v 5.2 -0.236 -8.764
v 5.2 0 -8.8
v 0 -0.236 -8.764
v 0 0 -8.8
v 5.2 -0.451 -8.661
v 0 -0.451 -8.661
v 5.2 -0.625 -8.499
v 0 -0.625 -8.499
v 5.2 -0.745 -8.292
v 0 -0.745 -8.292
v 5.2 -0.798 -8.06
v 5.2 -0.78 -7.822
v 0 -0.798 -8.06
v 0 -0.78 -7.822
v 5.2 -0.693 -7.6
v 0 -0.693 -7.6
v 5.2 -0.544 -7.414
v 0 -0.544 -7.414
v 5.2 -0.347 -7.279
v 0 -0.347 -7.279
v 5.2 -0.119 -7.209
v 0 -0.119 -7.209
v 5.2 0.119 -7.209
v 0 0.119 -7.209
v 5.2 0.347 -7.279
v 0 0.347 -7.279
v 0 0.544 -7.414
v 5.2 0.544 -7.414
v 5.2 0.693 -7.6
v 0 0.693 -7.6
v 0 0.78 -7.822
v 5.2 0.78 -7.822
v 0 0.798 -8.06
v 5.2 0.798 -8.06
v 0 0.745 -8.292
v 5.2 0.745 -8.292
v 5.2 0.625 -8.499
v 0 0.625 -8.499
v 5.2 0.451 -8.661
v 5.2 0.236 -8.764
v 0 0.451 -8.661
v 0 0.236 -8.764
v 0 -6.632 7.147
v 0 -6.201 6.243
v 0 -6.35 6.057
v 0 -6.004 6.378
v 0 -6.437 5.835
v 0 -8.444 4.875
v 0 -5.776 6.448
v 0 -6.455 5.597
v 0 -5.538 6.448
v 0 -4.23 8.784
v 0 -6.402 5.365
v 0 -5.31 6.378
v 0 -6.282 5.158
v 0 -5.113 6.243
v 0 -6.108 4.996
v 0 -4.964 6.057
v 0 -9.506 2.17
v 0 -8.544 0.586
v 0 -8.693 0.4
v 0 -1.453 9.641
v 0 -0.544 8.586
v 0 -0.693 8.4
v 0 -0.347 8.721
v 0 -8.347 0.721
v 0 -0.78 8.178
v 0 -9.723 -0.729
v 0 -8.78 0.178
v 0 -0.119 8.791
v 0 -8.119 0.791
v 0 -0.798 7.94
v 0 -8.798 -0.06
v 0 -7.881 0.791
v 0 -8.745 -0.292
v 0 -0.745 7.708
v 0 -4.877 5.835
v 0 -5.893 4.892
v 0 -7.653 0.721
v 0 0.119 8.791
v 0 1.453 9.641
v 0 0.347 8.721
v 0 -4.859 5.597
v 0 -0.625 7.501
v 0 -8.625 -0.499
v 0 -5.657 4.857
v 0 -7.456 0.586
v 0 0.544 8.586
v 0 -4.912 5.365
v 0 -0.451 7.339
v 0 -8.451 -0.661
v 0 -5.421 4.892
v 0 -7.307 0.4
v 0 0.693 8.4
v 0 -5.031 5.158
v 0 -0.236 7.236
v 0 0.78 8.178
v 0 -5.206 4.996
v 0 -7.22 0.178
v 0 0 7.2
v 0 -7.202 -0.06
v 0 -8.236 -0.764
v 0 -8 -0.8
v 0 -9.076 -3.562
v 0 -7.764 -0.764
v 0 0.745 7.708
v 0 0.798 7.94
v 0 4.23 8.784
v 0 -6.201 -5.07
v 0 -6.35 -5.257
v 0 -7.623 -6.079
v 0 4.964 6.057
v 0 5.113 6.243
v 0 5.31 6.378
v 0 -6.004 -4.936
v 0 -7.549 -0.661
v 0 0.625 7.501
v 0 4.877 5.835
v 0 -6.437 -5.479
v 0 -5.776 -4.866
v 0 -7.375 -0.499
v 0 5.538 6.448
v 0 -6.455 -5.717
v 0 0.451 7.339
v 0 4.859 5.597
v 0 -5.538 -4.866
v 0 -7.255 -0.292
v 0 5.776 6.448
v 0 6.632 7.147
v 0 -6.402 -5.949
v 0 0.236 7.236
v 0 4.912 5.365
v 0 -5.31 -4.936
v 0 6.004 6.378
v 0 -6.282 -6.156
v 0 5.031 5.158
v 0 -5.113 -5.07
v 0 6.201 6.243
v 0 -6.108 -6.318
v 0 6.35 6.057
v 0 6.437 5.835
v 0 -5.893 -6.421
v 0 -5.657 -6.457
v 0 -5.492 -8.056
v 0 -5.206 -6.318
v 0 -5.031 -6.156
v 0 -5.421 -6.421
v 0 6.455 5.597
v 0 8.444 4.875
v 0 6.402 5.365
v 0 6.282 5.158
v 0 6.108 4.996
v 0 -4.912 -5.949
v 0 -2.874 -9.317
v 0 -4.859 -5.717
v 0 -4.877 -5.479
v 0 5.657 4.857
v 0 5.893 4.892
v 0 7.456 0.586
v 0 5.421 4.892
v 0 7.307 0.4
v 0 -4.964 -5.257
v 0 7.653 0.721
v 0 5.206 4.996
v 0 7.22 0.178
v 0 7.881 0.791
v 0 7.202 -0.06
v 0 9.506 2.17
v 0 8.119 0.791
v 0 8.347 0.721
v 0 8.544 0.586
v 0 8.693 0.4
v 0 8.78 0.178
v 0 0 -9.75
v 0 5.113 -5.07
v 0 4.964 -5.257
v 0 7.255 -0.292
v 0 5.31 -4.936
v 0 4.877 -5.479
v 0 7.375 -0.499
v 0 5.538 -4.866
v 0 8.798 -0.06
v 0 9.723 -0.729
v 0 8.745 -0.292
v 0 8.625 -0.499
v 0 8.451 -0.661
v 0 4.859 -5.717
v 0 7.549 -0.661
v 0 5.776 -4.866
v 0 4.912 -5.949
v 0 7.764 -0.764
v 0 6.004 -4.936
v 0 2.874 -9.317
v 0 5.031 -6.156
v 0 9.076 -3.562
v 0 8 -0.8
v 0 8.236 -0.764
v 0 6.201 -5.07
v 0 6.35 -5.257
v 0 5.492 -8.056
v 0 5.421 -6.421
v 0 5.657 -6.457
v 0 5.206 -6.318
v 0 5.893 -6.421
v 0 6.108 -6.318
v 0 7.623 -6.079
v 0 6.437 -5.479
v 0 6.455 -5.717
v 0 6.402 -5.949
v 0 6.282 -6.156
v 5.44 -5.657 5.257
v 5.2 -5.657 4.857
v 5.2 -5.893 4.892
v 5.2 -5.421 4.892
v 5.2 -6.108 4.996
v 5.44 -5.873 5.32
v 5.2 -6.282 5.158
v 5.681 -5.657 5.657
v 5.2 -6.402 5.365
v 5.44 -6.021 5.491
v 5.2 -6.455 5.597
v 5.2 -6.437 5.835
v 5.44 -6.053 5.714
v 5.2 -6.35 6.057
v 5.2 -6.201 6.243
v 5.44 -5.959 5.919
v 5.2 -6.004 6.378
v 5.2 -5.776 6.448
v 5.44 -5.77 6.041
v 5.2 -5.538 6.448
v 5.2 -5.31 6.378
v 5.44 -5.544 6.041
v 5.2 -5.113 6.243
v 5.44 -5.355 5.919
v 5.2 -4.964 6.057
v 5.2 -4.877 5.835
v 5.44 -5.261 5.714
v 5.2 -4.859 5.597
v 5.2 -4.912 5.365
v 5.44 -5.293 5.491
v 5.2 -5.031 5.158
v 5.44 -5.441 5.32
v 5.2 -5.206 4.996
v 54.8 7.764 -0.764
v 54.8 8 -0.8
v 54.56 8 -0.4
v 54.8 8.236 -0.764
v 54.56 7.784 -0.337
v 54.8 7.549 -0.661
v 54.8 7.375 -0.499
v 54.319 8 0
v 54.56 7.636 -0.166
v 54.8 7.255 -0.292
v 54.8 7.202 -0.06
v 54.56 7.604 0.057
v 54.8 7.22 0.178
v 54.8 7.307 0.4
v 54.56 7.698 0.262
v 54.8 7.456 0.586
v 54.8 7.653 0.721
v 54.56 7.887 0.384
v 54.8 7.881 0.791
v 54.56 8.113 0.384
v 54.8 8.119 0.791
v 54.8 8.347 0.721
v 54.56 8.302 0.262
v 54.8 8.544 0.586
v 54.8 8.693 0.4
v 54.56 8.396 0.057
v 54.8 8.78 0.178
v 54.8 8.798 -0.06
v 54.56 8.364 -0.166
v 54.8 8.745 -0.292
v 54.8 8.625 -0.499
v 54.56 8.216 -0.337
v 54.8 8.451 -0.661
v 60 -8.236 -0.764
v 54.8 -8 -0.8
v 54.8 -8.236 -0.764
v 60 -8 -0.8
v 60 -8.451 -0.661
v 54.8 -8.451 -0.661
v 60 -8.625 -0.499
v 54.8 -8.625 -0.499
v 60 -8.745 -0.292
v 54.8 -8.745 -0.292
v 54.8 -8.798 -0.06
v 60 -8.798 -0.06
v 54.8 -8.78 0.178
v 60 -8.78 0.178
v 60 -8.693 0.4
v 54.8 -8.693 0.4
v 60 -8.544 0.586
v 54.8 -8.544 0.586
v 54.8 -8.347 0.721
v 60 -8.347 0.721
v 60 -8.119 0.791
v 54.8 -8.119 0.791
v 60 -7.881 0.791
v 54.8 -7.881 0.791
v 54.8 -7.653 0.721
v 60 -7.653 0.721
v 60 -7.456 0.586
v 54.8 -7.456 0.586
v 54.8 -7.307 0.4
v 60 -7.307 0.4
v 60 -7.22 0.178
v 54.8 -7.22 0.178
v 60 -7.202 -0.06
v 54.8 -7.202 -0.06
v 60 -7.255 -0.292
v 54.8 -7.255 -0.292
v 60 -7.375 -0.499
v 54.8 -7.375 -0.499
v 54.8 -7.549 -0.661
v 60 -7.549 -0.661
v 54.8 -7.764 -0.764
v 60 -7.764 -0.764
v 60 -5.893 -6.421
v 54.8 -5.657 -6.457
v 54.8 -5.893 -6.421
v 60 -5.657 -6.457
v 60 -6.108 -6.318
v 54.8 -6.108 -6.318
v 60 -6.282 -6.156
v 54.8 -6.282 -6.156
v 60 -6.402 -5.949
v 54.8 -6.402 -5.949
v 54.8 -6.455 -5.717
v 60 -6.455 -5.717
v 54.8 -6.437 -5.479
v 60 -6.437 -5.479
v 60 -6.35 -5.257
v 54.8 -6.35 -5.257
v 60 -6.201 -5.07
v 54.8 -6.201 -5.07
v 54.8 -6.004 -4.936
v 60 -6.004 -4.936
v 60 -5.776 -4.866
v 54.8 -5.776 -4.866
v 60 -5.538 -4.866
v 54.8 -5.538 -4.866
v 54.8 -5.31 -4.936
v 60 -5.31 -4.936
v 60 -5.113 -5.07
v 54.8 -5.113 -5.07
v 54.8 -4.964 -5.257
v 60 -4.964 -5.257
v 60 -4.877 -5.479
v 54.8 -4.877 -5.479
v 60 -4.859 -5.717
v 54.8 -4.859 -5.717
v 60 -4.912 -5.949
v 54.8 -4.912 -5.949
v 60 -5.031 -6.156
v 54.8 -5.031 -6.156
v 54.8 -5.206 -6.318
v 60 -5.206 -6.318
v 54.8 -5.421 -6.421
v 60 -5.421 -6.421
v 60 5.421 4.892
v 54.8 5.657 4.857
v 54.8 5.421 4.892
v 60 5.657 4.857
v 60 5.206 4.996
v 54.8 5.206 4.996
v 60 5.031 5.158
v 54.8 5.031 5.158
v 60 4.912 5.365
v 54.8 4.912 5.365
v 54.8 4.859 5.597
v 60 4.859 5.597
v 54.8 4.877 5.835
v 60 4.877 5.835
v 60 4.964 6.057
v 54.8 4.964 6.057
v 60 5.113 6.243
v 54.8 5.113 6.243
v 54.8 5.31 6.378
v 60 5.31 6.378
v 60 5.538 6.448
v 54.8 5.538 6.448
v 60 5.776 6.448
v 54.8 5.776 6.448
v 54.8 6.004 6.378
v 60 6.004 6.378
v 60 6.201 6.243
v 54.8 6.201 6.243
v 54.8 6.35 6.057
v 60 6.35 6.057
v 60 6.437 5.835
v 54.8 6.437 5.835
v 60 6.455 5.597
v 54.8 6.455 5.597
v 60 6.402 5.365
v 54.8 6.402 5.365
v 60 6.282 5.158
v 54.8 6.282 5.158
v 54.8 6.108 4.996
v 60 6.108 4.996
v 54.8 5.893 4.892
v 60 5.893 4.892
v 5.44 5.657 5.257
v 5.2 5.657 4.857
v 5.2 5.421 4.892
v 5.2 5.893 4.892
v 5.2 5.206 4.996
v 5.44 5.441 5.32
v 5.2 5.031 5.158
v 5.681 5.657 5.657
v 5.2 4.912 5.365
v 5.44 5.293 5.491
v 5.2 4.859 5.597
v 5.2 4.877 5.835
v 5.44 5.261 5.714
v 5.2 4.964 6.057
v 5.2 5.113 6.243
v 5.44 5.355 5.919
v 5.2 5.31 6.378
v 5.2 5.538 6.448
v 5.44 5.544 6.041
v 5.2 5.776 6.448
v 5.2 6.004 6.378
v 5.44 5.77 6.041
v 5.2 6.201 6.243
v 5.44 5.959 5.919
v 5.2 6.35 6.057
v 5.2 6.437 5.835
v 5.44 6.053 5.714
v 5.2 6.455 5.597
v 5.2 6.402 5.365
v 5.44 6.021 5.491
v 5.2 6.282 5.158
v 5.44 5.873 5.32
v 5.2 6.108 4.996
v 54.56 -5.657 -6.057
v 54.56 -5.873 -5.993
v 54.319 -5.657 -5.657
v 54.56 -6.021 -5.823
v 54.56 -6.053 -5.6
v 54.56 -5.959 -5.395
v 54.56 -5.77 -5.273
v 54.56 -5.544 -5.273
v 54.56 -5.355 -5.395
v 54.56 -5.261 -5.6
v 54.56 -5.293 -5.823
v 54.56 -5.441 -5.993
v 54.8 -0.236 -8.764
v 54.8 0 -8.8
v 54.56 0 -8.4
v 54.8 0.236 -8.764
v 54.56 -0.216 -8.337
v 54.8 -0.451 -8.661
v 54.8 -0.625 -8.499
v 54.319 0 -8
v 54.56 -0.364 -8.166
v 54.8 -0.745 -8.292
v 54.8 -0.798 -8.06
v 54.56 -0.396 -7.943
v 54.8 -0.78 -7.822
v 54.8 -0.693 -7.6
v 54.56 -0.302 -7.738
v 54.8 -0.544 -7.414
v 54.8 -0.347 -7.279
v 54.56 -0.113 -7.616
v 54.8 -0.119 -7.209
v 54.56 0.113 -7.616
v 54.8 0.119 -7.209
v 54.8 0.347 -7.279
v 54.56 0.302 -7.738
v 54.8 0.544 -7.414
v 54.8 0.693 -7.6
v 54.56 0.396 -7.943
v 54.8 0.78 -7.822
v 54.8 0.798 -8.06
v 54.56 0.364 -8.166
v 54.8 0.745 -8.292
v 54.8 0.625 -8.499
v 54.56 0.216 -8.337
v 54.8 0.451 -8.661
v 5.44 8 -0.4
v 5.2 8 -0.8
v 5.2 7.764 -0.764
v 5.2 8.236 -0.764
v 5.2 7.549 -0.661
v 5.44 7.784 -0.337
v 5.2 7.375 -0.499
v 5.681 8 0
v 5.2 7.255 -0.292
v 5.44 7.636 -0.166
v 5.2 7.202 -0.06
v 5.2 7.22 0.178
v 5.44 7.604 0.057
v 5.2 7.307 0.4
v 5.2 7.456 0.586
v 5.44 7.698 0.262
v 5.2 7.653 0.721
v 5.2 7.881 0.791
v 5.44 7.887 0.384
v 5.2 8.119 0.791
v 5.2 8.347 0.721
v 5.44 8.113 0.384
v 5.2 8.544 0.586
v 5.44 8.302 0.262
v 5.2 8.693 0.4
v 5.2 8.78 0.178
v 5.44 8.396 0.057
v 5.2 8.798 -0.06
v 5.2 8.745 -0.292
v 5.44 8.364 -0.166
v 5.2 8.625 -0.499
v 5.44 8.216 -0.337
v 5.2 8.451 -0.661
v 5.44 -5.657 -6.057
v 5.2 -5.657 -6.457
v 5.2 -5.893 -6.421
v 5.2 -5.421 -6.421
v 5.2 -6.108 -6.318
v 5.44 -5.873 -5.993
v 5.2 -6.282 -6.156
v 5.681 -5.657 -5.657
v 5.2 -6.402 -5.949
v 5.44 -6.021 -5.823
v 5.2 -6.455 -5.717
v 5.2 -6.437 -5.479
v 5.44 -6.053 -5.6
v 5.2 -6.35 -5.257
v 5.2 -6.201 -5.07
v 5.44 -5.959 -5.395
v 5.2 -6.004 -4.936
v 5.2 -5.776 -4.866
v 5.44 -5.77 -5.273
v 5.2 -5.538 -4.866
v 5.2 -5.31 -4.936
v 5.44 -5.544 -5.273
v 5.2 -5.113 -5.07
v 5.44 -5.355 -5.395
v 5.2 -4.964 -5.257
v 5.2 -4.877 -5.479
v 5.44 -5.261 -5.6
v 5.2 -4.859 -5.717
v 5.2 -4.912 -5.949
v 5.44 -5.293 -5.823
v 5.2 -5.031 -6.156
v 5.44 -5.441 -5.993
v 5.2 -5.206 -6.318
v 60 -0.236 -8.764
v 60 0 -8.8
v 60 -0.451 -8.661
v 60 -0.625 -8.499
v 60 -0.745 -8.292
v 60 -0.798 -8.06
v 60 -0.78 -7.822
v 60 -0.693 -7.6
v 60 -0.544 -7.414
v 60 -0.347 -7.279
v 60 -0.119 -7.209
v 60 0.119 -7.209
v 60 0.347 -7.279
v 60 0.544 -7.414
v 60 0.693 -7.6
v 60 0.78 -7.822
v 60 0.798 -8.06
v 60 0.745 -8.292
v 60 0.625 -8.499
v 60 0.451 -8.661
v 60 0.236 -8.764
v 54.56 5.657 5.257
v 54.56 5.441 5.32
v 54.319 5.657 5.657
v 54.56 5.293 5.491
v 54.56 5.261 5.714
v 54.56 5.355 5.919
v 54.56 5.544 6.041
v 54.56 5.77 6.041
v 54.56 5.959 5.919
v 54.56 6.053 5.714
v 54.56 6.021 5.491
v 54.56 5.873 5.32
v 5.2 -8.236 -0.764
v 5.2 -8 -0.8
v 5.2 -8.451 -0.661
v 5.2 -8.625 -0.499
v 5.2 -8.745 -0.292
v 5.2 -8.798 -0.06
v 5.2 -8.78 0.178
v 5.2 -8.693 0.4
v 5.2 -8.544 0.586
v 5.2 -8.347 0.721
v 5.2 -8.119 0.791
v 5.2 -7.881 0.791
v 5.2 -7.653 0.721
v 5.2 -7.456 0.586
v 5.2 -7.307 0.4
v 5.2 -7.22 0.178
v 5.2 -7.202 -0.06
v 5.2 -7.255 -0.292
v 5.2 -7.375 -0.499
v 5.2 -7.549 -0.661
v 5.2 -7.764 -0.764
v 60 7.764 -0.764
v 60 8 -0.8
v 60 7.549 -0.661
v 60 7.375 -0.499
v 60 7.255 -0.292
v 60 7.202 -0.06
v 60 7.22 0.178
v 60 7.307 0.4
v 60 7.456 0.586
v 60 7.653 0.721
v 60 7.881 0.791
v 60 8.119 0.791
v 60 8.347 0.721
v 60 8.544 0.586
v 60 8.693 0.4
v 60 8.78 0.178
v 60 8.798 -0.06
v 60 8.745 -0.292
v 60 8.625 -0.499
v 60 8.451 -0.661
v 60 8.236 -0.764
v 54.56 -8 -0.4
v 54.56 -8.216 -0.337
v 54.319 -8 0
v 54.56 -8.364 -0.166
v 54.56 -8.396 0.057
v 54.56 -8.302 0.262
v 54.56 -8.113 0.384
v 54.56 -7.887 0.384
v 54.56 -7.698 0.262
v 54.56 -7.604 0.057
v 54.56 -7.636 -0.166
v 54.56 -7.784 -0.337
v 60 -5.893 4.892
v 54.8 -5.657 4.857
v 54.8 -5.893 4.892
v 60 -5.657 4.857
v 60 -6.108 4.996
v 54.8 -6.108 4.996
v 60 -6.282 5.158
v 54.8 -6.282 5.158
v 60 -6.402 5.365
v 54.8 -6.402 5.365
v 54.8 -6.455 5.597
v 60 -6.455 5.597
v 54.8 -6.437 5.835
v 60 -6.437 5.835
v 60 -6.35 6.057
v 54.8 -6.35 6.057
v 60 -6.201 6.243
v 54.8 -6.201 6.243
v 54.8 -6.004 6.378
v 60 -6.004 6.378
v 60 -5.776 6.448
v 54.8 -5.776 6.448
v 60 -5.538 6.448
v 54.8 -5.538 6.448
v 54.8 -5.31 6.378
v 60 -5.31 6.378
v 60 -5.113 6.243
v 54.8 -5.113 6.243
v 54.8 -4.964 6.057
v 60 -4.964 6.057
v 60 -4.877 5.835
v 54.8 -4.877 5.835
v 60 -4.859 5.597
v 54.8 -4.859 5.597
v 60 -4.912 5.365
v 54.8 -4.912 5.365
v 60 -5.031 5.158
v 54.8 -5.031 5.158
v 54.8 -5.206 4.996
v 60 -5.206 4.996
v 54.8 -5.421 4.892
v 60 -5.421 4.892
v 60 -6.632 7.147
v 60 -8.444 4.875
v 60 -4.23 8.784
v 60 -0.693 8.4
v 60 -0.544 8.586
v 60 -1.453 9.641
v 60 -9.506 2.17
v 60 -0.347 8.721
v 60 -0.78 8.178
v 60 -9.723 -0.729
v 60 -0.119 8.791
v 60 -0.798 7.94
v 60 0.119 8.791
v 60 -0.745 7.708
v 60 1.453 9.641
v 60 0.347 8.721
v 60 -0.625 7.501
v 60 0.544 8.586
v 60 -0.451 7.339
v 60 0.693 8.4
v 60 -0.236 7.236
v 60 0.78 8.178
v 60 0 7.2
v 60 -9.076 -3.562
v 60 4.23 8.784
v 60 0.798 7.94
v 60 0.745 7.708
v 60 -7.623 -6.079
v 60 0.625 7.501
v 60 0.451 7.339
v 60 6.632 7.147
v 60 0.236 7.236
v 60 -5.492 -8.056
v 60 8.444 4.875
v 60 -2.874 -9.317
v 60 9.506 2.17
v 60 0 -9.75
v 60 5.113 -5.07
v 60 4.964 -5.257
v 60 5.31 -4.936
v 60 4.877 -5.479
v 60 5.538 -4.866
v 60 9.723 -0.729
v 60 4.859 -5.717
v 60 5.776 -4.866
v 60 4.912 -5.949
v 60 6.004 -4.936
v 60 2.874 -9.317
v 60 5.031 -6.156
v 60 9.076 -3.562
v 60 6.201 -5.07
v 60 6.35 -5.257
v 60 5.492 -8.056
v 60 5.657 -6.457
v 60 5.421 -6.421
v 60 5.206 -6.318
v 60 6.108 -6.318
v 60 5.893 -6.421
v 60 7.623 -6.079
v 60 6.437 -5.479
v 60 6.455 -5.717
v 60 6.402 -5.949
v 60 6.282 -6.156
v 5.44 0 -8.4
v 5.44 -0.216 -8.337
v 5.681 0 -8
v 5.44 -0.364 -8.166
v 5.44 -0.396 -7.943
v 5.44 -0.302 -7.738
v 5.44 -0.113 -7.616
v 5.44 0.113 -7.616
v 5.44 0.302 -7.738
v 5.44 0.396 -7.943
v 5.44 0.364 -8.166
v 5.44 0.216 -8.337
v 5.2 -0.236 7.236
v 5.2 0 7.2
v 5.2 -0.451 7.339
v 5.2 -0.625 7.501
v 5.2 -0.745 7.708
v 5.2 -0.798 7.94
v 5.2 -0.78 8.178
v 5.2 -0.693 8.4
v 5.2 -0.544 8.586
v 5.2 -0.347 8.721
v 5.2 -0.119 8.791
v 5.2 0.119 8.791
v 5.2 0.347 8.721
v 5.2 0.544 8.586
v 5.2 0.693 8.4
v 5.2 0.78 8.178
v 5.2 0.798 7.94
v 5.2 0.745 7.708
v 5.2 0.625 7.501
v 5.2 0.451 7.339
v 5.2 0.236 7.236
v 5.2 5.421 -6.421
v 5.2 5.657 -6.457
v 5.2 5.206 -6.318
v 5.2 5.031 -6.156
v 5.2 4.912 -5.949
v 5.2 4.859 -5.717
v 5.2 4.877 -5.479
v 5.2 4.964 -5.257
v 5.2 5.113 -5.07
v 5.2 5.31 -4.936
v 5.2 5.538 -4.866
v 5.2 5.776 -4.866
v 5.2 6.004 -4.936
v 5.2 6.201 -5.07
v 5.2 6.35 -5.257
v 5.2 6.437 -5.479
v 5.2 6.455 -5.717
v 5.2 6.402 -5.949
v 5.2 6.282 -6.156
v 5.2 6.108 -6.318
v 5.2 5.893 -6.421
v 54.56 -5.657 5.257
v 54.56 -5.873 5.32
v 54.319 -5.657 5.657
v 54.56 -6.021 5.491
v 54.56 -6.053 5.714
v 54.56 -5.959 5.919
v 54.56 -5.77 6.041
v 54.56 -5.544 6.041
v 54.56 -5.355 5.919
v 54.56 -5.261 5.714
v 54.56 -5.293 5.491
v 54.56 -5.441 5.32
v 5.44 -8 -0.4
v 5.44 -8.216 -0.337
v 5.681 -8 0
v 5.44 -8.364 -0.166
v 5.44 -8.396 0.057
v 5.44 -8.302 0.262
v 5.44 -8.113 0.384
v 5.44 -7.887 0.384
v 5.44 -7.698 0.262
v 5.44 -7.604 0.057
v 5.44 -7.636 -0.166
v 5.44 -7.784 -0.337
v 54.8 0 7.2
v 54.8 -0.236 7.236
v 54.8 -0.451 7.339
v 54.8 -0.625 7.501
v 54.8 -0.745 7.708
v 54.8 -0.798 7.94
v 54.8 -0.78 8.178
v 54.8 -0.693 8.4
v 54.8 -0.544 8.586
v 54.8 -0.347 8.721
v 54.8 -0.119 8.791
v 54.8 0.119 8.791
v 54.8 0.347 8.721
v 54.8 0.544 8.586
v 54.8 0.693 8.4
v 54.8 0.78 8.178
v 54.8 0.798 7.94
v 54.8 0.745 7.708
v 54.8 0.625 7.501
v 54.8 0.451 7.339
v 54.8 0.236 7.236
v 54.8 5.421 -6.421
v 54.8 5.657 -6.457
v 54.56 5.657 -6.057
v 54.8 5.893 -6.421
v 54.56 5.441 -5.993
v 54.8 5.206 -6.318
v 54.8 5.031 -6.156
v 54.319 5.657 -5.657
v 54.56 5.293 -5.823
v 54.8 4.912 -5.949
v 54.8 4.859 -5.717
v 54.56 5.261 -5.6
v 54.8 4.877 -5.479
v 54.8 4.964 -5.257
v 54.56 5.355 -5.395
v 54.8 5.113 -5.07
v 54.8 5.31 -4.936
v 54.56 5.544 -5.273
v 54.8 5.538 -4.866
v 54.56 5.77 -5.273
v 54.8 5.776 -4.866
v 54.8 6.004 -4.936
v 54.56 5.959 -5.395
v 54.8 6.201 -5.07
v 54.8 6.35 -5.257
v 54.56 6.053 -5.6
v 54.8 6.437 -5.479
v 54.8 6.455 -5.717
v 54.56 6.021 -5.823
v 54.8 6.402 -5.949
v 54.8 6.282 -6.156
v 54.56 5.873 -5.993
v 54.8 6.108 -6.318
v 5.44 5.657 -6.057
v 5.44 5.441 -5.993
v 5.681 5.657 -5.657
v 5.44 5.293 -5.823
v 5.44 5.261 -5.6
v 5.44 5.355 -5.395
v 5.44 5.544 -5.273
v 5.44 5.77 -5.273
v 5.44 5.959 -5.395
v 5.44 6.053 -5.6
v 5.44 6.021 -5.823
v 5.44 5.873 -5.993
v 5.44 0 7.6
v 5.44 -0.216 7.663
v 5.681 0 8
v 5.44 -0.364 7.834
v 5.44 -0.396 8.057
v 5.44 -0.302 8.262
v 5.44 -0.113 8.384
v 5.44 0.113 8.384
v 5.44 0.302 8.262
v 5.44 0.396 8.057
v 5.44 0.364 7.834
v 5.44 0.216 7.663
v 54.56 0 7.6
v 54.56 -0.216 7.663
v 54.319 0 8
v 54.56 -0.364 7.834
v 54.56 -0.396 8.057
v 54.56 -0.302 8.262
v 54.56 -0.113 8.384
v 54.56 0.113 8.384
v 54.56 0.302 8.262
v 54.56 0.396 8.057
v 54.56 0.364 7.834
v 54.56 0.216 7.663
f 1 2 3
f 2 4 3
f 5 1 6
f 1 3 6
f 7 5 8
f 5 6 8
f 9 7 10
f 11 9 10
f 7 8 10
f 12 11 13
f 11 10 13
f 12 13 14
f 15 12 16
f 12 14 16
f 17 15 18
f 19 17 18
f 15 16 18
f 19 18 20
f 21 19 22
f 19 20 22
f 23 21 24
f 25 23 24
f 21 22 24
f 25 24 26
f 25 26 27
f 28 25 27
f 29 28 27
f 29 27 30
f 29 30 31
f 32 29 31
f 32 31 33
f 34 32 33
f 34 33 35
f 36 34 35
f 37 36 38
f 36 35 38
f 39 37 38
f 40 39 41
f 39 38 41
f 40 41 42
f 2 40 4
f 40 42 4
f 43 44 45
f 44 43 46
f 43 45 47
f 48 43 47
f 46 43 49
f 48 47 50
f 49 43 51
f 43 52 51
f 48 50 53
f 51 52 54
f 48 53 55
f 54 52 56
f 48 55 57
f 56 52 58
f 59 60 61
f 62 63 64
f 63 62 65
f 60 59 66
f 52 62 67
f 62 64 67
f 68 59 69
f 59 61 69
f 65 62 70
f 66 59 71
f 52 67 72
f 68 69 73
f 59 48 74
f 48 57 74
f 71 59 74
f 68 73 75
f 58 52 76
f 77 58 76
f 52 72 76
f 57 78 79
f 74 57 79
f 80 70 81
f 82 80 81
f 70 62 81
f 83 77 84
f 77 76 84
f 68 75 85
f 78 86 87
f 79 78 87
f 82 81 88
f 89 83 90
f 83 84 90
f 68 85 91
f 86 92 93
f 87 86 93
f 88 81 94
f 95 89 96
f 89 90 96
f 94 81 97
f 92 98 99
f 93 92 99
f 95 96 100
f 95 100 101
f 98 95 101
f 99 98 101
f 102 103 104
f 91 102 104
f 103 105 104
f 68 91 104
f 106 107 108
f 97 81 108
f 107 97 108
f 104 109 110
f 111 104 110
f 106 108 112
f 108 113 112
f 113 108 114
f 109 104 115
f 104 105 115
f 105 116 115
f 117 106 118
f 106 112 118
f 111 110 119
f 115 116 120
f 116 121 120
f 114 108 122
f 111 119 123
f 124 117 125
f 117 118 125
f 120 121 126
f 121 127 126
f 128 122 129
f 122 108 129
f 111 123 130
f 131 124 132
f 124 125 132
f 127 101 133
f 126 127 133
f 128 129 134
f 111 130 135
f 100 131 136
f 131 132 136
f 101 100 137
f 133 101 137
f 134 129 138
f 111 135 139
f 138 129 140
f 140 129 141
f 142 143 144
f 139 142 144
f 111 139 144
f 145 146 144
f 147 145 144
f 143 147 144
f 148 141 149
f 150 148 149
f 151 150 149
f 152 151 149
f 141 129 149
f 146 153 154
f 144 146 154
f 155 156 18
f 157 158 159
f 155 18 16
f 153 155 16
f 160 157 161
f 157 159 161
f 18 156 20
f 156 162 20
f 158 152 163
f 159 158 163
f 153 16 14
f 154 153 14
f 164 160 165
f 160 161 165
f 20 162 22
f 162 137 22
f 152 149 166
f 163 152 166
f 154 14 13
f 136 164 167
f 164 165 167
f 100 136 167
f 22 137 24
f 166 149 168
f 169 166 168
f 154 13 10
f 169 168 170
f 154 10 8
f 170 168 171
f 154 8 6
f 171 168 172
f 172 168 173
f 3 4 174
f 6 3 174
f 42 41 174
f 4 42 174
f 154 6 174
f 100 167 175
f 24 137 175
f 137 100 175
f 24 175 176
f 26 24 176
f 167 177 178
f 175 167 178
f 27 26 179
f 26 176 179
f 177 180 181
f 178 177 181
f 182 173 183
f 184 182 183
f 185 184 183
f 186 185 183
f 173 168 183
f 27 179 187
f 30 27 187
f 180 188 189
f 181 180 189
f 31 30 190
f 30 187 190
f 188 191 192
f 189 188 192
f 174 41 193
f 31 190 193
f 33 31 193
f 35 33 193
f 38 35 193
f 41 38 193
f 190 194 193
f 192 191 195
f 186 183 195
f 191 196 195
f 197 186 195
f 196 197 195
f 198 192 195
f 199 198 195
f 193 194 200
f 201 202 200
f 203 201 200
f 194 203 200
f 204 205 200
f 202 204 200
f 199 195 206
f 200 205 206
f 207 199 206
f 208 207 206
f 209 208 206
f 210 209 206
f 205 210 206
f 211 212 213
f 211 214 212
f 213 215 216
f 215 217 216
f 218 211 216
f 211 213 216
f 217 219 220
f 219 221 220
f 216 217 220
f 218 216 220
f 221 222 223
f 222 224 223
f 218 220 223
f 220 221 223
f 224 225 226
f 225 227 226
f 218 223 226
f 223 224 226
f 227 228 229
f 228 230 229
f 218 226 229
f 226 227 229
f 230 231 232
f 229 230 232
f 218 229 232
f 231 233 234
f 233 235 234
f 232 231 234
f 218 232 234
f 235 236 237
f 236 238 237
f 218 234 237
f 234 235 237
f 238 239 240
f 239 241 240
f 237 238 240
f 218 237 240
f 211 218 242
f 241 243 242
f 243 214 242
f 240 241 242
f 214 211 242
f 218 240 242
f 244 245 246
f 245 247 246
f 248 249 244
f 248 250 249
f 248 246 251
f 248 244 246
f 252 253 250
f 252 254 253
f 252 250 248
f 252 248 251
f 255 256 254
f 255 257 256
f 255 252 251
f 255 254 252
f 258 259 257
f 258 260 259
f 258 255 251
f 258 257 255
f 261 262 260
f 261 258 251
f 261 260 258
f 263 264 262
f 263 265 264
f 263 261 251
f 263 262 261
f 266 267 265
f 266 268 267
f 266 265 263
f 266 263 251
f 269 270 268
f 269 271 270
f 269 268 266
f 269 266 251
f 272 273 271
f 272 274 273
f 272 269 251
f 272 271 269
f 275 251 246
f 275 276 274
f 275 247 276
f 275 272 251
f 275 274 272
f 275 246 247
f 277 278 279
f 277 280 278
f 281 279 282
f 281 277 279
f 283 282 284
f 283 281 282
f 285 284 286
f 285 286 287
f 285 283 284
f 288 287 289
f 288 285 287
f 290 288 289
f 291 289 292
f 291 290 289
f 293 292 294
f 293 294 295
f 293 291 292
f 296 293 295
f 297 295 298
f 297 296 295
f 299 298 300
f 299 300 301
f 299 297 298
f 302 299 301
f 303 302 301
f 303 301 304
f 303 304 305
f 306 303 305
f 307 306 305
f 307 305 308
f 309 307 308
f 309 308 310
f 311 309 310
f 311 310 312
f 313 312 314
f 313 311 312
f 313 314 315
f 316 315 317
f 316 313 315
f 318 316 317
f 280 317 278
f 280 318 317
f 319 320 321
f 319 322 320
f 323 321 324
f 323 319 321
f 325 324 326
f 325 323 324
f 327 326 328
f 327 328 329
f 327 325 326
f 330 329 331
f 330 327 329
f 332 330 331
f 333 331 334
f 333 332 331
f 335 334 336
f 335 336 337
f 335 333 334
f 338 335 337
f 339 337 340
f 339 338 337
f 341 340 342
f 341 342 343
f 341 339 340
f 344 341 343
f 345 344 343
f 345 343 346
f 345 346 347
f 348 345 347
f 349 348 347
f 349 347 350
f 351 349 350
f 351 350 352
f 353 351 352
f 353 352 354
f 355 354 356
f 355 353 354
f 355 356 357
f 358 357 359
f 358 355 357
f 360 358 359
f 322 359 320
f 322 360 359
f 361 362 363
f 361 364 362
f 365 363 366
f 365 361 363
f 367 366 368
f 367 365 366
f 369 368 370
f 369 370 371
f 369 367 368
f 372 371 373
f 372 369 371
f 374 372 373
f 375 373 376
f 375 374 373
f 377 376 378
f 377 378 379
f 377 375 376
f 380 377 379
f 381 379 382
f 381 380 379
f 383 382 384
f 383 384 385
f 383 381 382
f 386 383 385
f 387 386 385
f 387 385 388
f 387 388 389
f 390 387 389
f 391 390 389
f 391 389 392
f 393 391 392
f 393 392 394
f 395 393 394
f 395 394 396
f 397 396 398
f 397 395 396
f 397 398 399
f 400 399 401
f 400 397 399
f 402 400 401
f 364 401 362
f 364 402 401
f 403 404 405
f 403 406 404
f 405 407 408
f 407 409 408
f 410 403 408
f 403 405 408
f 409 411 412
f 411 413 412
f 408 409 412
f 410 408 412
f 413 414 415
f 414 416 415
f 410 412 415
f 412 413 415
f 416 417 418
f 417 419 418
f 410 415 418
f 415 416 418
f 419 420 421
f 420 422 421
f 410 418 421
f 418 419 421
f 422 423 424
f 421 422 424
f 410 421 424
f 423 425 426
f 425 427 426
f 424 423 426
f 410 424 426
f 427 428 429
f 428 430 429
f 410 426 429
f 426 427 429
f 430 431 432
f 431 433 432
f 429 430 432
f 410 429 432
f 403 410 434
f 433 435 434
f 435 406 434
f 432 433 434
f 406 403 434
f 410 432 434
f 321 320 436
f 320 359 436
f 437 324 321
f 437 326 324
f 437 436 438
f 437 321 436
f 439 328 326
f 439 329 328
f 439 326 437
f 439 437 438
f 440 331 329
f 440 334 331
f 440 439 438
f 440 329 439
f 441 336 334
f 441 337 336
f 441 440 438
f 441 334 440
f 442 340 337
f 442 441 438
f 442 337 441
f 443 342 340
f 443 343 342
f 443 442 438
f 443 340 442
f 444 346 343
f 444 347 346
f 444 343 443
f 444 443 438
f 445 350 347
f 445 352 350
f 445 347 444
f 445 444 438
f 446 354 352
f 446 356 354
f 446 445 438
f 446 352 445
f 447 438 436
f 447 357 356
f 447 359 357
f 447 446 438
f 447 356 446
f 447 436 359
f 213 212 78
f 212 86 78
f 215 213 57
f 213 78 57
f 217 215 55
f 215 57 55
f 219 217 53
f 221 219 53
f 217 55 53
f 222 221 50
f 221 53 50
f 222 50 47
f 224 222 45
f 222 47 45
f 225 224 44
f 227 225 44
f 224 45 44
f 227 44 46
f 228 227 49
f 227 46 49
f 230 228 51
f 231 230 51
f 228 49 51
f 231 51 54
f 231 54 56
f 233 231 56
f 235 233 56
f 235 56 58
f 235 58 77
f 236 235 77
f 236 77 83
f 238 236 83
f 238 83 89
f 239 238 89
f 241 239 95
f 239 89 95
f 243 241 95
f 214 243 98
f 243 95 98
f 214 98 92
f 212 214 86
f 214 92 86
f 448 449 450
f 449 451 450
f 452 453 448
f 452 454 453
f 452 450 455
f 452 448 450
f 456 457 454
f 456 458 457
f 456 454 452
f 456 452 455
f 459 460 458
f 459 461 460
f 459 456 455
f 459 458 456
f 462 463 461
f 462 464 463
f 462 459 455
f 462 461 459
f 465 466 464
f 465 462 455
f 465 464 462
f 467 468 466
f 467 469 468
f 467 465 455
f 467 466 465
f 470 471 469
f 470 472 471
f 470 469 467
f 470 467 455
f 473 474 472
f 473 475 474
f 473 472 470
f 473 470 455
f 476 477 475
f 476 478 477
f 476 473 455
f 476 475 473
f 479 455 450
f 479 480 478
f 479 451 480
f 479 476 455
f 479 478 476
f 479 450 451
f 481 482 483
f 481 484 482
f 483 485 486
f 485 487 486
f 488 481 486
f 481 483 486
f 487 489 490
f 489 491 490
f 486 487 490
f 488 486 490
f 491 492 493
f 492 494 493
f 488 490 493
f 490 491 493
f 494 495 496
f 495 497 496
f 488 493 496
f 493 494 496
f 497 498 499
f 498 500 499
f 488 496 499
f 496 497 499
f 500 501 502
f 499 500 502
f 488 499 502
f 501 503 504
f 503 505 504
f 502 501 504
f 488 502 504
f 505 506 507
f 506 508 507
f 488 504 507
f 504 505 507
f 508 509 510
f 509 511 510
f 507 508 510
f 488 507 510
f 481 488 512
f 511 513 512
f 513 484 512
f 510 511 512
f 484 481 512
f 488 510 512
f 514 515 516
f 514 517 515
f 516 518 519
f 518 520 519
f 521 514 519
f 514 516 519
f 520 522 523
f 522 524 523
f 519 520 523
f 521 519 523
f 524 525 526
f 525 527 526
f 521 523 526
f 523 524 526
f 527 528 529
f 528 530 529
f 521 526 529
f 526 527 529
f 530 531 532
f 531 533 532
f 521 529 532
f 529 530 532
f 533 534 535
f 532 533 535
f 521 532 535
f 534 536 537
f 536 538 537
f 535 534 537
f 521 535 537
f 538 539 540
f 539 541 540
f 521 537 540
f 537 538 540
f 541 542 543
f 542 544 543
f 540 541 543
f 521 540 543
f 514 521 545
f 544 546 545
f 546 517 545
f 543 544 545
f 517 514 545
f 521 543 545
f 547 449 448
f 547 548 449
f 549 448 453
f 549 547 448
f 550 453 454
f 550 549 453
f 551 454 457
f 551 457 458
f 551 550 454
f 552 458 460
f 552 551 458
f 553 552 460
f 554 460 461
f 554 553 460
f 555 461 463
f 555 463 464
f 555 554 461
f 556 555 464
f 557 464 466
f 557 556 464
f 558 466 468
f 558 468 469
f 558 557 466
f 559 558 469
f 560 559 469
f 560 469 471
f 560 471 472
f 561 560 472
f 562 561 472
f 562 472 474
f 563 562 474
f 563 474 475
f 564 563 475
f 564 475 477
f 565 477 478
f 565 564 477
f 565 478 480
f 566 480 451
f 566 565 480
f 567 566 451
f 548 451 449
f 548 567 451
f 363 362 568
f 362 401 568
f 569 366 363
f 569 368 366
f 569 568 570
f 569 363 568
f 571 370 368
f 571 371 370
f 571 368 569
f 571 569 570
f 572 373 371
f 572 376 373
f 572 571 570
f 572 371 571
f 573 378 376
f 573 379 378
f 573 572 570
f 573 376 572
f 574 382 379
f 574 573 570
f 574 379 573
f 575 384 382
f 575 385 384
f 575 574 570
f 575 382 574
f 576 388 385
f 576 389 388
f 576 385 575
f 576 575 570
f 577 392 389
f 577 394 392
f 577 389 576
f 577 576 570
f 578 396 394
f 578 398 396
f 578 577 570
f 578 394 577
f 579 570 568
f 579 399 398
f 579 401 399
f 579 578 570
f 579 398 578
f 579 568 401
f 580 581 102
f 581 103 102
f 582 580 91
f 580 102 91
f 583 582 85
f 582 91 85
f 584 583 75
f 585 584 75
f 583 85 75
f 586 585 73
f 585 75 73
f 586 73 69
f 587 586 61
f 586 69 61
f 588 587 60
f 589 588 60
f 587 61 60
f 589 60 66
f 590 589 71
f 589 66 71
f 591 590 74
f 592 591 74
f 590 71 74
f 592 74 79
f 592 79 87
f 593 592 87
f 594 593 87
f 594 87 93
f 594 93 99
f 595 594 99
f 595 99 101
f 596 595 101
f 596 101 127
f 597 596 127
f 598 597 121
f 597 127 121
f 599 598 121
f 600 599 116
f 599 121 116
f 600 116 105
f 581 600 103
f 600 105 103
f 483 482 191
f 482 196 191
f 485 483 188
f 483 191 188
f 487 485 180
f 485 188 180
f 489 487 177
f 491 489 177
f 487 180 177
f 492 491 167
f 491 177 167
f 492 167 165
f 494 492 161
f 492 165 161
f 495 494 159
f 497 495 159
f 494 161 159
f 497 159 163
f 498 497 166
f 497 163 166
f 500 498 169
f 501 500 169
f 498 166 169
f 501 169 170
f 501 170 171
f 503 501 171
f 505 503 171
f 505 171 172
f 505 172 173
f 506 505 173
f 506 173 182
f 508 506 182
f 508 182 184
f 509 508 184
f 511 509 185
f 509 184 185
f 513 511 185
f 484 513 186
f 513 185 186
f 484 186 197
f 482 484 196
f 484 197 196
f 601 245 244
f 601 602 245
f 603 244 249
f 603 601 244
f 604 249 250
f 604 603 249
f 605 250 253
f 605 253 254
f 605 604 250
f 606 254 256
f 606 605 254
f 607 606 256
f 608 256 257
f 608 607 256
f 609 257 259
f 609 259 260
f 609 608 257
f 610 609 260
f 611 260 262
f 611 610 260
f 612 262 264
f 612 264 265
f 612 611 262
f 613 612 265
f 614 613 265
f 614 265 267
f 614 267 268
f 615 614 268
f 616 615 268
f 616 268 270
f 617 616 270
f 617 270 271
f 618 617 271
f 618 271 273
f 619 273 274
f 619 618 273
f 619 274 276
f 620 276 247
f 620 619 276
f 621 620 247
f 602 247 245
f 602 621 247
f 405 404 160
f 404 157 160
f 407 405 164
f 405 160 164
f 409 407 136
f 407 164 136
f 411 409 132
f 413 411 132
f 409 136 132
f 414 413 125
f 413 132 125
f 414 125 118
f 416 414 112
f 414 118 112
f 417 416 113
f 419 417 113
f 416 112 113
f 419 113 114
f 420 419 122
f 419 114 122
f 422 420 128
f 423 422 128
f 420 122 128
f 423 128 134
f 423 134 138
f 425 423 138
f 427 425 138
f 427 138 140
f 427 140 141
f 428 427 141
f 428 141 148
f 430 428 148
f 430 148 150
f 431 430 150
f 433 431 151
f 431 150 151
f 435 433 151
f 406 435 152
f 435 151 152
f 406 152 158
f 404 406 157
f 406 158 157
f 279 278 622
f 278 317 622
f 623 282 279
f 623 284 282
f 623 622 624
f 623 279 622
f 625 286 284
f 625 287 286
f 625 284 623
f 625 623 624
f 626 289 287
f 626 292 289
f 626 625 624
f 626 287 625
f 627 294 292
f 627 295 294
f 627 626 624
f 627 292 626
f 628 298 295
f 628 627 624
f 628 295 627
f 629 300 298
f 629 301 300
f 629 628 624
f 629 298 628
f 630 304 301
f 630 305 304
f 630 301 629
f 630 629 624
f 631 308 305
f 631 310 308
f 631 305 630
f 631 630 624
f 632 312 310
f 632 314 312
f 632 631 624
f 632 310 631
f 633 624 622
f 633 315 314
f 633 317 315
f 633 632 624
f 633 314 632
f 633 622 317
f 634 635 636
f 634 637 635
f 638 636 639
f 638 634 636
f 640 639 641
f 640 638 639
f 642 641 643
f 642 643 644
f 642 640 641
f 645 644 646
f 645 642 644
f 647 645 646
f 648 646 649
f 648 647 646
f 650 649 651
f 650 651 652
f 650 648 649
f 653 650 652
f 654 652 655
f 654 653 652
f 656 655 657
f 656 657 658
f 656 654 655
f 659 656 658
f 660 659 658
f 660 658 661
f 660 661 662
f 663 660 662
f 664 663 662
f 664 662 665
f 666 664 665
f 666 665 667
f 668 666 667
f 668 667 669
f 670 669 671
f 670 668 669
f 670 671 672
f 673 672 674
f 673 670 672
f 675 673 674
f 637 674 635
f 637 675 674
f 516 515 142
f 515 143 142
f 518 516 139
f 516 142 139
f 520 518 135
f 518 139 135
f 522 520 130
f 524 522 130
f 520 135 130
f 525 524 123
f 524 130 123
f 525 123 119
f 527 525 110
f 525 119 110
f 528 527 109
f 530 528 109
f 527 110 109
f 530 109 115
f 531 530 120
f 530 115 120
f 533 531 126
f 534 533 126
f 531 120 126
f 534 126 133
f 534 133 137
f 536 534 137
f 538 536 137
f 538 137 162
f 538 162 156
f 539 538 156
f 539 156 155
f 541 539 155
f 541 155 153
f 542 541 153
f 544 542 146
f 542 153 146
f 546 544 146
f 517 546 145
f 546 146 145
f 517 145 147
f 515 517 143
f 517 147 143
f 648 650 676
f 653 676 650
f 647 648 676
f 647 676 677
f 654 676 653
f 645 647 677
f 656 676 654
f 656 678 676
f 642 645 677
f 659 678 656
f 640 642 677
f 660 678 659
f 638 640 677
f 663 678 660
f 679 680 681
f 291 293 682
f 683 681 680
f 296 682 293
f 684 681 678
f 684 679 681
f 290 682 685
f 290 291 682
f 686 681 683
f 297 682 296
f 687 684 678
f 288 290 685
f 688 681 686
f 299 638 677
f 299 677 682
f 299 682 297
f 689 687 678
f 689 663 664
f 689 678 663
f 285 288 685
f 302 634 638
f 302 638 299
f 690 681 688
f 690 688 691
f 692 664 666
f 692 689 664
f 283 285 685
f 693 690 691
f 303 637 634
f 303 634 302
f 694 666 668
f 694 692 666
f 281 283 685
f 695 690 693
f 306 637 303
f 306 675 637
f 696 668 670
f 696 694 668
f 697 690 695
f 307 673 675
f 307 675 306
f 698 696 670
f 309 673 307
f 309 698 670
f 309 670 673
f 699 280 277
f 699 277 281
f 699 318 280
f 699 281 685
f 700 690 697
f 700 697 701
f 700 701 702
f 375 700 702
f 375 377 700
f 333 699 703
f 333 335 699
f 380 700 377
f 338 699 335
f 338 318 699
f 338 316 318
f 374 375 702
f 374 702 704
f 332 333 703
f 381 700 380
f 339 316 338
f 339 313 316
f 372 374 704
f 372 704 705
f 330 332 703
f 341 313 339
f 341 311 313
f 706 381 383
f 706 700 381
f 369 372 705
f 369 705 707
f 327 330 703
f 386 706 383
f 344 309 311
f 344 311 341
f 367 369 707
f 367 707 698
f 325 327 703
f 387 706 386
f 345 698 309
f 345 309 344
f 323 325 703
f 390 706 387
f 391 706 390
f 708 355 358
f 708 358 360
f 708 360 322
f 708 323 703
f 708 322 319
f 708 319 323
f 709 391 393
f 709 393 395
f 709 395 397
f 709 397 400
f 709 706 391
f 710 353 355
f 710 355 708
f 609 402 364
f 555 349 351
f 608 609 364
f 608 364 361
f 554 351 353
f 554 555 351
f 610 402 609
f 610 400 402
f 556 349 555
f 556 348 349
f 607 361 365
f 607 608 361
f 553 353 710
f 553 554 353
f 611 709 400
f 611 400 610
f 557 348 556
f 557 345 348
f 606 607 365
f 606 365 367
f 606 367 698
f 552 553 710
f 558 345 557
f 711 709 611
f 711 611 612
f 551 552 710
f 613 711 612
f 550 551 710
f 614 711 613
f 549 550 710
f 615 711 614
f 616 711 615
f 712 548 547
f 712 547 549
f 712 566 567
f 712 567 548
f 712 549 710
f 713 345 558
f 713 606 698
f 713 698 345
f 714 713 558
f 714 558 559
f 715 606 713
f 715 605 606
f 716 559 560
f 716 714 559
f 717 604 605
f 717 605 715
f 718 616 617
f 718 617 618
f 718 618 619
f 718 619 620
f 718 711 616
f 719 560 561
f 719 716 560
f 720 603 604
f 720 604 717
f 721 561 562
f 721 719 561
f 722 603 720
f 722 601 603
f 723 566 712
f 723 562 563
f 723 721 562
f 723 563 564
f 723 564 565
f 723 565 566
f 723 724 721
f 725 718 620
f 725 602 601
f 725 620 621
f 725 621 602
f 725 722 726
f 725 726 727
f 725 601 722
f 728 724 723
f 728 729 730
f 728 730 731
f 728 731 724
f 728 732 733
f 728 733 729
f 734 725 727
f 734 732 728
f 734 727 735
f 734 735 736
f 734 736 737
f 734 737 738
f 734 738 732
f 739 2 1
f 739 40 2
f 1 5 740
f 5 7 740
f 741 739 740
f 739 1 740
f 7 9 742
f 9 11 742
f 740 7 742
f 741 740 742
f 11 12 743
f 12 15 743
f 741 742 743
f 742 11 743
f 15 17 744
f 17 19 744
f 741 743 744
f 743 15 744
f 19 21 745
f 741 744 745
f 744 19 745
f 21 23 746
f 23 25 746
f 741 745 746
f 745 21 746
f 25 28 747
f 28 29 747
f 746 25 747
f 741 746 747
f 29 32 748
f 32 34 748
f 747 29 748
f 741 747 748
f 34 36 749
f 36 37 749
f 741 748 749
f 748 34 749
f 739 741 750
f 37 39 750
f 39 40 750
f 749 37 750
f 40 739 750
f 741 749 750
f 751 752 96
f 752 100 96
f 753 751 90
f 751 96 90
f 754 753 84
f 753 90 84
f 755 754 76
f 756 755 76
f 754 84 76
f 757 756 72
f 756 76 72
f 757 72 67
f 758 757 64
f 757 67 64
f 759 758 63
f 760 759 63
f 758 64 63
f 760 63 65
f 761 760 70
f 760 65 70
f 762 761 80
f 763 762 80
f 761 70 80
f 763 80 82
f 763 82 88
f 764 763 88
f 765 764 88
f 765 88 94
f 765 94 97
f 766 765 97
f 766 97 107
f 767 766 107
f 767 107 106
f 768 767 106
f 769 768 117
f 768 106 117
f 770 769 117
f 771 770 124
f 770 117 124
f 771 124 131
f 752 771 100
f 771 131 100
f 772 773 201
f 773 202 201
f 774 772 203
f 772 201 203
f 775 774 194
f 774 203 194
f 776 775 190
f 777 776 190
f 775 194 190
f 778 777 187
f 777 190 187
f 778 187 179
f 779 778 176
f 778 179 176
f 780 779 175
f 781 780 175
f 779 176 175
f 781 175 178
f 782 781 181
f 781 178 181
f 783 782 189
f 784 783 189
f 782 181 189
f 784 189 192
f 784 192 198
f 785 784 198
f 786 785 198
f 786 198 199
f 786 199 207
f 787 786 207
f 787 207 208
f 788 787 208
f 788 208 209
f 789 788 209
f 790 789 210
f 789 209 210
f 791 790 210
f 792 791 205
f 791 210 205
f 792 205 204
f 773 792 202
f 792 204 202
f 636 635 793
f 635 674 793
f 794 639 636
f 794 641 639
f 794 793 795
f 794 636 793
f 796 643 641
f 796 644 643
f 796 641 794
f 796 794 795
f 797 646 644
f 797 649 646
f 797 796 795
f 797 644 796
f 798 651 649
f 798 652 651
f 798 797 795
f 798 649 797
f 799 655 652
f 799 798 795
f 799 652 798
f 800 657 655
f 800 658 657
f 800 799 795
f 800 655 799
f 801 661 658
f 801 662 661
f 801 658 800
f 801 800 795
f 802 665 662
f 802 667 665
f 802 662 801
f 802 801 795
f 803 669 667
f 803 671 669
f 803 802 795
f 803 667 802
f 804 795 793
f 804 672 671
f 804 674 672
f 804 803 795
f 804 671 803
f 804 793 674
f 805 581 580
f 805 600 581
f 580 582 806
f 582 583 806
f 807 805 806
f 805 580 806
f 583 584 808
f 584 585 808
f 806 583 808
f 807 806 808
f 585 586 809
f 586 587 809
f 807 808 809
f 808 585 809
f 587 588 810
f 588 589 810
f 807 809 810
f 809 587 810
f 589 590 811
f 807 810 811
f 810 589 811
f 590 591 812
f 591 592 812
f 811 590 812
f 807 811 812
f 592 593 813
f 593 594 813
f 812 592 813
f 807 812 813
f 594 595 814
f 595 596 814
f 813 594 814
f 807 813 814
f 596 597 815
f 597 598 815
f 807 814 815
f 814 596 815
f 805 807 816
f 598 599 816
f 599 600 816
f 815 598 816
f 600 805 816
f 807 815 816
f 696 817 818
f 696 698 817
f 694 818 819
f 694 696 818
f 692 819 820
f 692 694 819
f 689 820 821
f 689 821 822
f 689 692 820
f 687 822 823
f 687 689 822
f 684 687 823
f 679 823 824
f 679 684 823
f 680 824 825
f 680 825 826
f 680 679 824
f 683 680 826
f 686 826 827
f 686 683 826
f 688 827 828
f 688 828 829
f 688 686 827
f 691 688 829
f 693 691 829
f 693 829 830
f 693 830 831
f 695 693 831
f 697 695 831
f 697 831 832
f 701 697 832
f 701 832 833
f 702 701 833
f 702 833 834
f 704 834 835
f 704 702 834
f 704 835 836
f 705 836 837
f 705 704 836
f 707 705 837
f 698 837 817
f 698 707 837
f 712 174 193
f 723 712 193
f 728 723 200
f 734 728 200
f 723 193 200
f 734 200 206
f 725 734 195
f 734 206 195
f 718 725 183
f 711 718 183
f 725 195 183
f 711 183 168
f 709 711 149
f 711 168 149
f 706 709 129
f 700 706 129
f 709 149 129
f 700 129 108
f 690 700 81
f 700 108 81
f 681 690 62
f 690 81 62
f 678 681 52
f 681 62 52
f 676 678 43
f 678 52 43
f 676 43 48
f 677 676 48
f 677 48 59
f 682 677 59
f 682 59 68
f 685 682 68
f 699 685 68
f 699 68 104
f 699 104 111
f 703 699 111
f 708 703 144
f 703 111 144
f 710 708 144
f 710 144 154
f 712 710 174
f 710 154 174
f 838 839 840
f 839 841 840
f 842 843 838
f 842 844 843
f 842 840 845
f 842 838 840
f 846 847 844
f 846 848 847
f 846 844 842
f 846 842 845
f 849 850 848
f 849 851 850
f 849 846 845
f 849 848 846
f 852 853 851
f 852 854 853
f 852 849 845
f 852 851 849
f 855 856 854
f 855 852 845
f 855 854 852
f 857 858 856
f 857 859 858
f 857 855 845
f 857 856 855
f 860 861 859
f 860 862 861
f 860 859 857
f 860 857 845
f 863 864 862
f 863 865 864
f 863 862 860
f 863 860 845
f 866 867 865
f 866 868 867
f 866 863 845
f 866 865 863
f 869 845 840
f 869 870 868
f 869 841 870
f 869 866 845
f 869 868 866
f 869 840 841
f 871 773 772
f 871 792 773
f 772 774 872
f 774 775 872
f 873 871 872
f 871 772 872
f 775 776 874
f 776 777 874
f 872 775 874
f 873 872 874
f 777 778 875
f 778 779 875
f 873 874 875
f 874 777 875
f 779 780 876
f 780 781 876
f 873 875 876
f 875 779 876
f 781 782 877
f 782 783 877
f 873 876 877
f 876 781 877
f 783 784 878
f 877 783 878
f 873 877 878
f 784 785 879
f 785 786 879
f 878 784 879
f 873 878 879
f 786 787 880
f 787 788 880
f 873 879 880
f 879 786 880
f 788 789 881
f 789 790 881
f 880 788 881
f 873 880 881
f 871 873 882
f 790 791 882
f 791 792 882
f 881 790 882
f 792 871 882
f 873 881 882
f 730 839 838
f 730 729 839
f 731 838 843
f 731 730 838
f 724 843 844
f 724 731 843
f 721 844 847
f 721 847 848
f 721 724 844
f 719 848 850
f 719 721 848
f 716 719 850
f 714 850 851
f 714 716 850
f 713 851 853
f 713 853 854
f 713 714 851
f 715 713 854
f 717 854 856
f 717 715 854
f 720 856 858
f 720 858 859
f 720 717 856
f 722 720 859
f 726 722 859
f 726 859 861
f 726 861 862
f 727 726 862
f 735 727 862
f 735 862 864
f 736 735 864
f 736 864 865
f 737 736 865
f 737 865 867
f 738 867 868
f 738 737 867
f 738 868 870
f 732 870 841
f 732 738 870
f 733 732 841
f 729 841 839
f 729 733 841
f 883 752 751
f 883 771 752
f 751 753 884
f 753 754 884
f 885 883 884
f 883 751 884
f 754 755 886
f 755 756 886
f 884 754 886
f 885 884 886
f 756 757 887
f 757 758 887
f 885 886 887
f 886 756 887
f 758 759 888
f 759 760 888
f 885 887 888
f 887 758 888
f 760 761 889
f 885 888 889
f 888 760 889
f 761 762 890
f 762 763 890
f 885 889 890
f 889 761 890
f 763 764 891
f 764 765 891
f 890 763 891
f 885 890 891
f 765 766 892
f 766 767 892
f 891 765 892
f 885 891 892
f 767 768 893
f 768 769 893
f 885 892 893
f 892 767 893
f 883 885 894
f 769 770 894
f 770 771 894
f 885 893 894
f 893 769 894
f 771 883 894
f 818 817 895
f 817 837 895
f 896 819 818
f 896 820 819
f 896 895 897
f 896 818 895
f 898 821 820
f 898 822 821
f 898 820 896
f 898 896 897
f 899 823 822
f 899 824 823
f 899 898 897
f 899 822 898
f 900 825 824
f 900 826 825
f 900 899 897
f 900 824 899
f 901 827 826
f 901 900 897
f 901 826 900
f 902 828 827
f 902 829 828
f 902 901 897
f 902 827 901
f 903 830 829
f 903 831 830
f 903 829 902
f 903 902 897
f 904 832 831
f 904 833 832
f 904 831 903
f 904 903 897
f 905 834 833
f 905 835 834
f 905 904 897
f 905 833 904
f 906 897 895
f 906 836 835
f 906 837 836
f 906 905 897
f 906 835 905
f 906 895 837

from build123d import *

# Parameters (mm, degrees)
SKETCH1_R                  = 9.75
BOSS_EXTRUDE1_DEPTH        = 60
M2_TAPPED_HOLE1_AT_2_COUNT = 2
M2_TAPPED_HOLE1_AT_2_PITCH = 6.122934918
M2_TAPPED_HOLE1_AT_3_COUNT = 2
M2_TAPPED_HOLE1_AT_3_PITCH = 11.313708499
M2_TAPPED_HOLE1_AT_4_COUNT = 2
M2_TAPPED_HOLE1_AT_4_PITCH = 14.78207252
M2_TAPPED_HOLE1_AT_5_COUNT = 2
M2_TAPPED_HOLE1_AT_5_PITCH = 16
M2_TAPPED_HOLE1_AT_6_COUNT = 2
M2_TAPPED_HOLE1_AT_6_PITCH = 14.78207252
M2_TAPPED_HOLE1_AT_7_COUNT = 2
M2_TAPPED_HOLE1_AT_7_PITCH = 11.313708499
M2_TAPPED_HOLE1_AT_8_COUNT = 2
M2_TAPPED_HOLE1_AT_8_PITCH = 6.122934918


with BuildPart() as part:
    # Sketch1 → Boss-Extrude1 (new body)
    with BuildSketch(Plane(origin=(0, 0, 0), x_dir=(0, 0, -1), z_dir=(1, 0, 0))):
        Circle(SKETCH1_R)
    extrude(amount=BOSS_EXTRUDE1_DEPTH)

    # Sketch4 → M2 Tapped Hole1 (revolve, cut)
    with BuildSketch(Plane(origin=(60, 8, 0), x_dir=(0, 0, -1), z_dir=(0, 1, 0))):
        Polygon((0, 0), (0, 5.680688495), (0.8, 5.2), (0.8, 0), align=None)
    m2_tapped_hole1 = revolve(axis=Axis((66.35, 8, 0), (-1, 0, 0)), mode=Mode.SUBTRACT)

    # M2 Tapped Hole1 at 2: M2 Tapped Hole1 ×2
    with Locations(*[Vector(0, -0.3826834323650503, -0.9238795325113031) * (i * M2_TAPPED_HOLE1_AT_2_PITCH) for i in range(1, M2_TAPPED_HOLE1_AT_2_COUNT)]):
        add(m2_tapped_hole1, mode=Mode.SUBTRACT)

    # M2 Tapped Hole1 at 3: M2 Tapped Hole1 ×2
    with Locations(*[Vector(0, -0.7071067811865174, -0.7071067811865777) * (i * M2_TAPPED_HOLE1_AT_3_PITCH) for i in range(1, M2_TAPPED_HOLE1_AT_3_COUNT)]):
        add(m2_tapped_hole1, mode=Mode.SUBTRACT)

    # M2 Tapped Hole1 at 4: M2 Tapped Hole1 ×2
    with Locations(*[Vector(0, -0.9238795325112705, -0.38268343236512903) * (i * M2_TAPPED_HOLE1_AT_4_PITCH) for i in range(1, M2_TAPPED_HOLE1_AT_4_COUNT)]):
        add(m2_tapped_hole1, mode=Mode.SUBTRACT)

    # M2 Tapped Hole1 at 5: M2 Tapped Hole1 ×2
    with Locations(*[(0, -i * M2_TAPPED_HOLE1_AT_5_PITCH, 0) for i in range(1, M2_TAPPED_HOLE1_AT_5_COUNT)]):
        add(m2_tapped_hole1, mode=Mode.SUBTRACT)

    # M2 Tapped Hole1 at 6: M2 Tapped Hole1 ×2
    with Locations(*[Vector(0, -0.9238795325113031, 0.3826834323650506) * (i * M2_TAPPED_HOLE1_AT_6_PITCH) for i in range(1, M2_TAPPED_HOLE1_AT_6_COUNT)]):
        add(m2_tapped_hole1, mode=Mode.SUBTRACT)

    # M2 Tapped Hole1 at 7: M2 Tapped Hole1 ×2
    with Locations(*[Vector(0, -0.7071067811865777, 0.7071067811865174) * (i * M2_TAPPED_HOLE1_AT_7_PITCH) for i in range(1, M2_TAPPED_HOLE1_AT_7_COUNT)]):
        add(m2_tapped_hole1, mode=Mode.SUBTRACT)

    # M2 Tapped Hole1 at 8: M2 Tapped Hole1 ×2
    with Locations(*[Vector(0, -0.3826834323651289, 0.9238795325112706) * (i * M2_TAPPED_HOLE1_AT_8_PITCH) for i in range(1, M2_TAPPED_HOLE1_AT_8_COUNT)]):
        add(m2_tapped_hole1, mode=Mode.SUBTRACT)

    # Mirror1: M2 Tapped Hole1 across plane
    add(m2_tapped_hole1.mirror(Plane(origin=(30, 0, 0), x_dir=(0, 0, 1), z_dir=(1, 0, 0))), mode=Mode.SUBTRACT)

    # Mirror1 copy 1 sketch → Mirror1 copy 1 (revolve, cut)
    with BuildSketch(Plane(origin=(0, 5.656854249, -5.656854249), x_dir=(0, 0, -1), z_dir=(0, 1, 0))):
        Polygon((0, 0), (0, -5.680688495), (0.8, -5.2), (0.8, 0), align=None)
    revolve(axis=Axis((-6.35, 5.656854249, -5.656854249), (-1, 0, 0)), mode=Mode.SUBTRACT)

    # Mirror1 copy 2 sketch → Mirror1 copy 2 (revolve, cut)
    with BuildSketch(Plane(origin=(0, 0, -8), x_dir=(0, 0, -1), z_dir=(0, 1, 0))):
        Polygon((0, 0), (0, -5.680688495), (0.8, -5.2), (0.8, 0), align=None)
    revolve(axis=Axis((-6.35, 0, -8), (-1, 0, 0)), mode=Mode.SUBTRACT)

    # Mirror1 copy 3 sketch → Mirror1 copy 3 (revolve, cut)
    with BuildSketch(Plane(origin=(0, -5.656854249, -5.656854249), x_dir=(0, 0, -1), z_dir=(0, 1, 0))):
        Polygon((0, 0), (0, -5.680688495), (0.8, -5.2), (0.8, 0), align=None)
    revolve(axis=Axis((-6.35, -5.656854249, -5.656854249), (-1, 0, 0)), mode=Mode.SUBTRACT)

    # Mirror1 copy 4 sketch → Mirror1 copy 4 (revolve, cut)
    with BuildSketch(Plane(origin=(0, -8, 0), x_dir=(0, 0, -1), z_dir=(0, 1, 0))):
        Polygon((0, 0), (0, -5.680688495), (0.8, -5.2), (0.8, 0), align=None)
    revolve(axis=Axis((-6.35, -8, 0), (-1, 0, 0)), mode=Mode.SUBTRACT)

    # Mirror1 copy 5 sketch → Mirror1 copy 5 (revolve, cut)
    with BuildSketch(Plane(origin=(0, -5.656854249, 5.656854249), x_dir=(0, 0, -1), z_dir=(0, 1, 0))):
        Polygon((0, 0), (0, -5.680688495), (0.8, -5.2), (0.8, 0), align=None)
    revolve(axis=Axis((-6.35, -5.656854249, 5.656854249), (-1, 0, 0)), mode=Mode.SUBTRACT)

    # Mirror1 copy 6 sketch → Mirror1 copy 6 (revolve, cut)
    with BuildSketch(Plane(origin=(0, 0, 8), x_dir=(0, 0, -1), z_dir=(0, 1, 0))):
        Polygon((0, 0), (0, -5.680688495), (0.8, -5.2), (0.8, 0), align=None)
    revolve(axis=Axis((-6.35, 0, 8), (-1, 0, 0)), mode=Mode.SUBTRACT)

    # Mirror1 copy 7 sketch → Mirror1 copy 7 (revolve, cut)
    with BuildSketch(Plane(origin=(0, 5.656854249, 5.656854249), x_dir=(0, 0, -1), z_dir=(0, 1, 0))):
        Polygon((0, 0), (0, -5.680688495), (0.8, -5.2), (0.8, 0), align=None)
    revolve(axis=Axis((-6.35, 5.656854249, 5.656854249), (-1, 0, 0)), mode=Mode.SUBTRACT)


solid = part.part
